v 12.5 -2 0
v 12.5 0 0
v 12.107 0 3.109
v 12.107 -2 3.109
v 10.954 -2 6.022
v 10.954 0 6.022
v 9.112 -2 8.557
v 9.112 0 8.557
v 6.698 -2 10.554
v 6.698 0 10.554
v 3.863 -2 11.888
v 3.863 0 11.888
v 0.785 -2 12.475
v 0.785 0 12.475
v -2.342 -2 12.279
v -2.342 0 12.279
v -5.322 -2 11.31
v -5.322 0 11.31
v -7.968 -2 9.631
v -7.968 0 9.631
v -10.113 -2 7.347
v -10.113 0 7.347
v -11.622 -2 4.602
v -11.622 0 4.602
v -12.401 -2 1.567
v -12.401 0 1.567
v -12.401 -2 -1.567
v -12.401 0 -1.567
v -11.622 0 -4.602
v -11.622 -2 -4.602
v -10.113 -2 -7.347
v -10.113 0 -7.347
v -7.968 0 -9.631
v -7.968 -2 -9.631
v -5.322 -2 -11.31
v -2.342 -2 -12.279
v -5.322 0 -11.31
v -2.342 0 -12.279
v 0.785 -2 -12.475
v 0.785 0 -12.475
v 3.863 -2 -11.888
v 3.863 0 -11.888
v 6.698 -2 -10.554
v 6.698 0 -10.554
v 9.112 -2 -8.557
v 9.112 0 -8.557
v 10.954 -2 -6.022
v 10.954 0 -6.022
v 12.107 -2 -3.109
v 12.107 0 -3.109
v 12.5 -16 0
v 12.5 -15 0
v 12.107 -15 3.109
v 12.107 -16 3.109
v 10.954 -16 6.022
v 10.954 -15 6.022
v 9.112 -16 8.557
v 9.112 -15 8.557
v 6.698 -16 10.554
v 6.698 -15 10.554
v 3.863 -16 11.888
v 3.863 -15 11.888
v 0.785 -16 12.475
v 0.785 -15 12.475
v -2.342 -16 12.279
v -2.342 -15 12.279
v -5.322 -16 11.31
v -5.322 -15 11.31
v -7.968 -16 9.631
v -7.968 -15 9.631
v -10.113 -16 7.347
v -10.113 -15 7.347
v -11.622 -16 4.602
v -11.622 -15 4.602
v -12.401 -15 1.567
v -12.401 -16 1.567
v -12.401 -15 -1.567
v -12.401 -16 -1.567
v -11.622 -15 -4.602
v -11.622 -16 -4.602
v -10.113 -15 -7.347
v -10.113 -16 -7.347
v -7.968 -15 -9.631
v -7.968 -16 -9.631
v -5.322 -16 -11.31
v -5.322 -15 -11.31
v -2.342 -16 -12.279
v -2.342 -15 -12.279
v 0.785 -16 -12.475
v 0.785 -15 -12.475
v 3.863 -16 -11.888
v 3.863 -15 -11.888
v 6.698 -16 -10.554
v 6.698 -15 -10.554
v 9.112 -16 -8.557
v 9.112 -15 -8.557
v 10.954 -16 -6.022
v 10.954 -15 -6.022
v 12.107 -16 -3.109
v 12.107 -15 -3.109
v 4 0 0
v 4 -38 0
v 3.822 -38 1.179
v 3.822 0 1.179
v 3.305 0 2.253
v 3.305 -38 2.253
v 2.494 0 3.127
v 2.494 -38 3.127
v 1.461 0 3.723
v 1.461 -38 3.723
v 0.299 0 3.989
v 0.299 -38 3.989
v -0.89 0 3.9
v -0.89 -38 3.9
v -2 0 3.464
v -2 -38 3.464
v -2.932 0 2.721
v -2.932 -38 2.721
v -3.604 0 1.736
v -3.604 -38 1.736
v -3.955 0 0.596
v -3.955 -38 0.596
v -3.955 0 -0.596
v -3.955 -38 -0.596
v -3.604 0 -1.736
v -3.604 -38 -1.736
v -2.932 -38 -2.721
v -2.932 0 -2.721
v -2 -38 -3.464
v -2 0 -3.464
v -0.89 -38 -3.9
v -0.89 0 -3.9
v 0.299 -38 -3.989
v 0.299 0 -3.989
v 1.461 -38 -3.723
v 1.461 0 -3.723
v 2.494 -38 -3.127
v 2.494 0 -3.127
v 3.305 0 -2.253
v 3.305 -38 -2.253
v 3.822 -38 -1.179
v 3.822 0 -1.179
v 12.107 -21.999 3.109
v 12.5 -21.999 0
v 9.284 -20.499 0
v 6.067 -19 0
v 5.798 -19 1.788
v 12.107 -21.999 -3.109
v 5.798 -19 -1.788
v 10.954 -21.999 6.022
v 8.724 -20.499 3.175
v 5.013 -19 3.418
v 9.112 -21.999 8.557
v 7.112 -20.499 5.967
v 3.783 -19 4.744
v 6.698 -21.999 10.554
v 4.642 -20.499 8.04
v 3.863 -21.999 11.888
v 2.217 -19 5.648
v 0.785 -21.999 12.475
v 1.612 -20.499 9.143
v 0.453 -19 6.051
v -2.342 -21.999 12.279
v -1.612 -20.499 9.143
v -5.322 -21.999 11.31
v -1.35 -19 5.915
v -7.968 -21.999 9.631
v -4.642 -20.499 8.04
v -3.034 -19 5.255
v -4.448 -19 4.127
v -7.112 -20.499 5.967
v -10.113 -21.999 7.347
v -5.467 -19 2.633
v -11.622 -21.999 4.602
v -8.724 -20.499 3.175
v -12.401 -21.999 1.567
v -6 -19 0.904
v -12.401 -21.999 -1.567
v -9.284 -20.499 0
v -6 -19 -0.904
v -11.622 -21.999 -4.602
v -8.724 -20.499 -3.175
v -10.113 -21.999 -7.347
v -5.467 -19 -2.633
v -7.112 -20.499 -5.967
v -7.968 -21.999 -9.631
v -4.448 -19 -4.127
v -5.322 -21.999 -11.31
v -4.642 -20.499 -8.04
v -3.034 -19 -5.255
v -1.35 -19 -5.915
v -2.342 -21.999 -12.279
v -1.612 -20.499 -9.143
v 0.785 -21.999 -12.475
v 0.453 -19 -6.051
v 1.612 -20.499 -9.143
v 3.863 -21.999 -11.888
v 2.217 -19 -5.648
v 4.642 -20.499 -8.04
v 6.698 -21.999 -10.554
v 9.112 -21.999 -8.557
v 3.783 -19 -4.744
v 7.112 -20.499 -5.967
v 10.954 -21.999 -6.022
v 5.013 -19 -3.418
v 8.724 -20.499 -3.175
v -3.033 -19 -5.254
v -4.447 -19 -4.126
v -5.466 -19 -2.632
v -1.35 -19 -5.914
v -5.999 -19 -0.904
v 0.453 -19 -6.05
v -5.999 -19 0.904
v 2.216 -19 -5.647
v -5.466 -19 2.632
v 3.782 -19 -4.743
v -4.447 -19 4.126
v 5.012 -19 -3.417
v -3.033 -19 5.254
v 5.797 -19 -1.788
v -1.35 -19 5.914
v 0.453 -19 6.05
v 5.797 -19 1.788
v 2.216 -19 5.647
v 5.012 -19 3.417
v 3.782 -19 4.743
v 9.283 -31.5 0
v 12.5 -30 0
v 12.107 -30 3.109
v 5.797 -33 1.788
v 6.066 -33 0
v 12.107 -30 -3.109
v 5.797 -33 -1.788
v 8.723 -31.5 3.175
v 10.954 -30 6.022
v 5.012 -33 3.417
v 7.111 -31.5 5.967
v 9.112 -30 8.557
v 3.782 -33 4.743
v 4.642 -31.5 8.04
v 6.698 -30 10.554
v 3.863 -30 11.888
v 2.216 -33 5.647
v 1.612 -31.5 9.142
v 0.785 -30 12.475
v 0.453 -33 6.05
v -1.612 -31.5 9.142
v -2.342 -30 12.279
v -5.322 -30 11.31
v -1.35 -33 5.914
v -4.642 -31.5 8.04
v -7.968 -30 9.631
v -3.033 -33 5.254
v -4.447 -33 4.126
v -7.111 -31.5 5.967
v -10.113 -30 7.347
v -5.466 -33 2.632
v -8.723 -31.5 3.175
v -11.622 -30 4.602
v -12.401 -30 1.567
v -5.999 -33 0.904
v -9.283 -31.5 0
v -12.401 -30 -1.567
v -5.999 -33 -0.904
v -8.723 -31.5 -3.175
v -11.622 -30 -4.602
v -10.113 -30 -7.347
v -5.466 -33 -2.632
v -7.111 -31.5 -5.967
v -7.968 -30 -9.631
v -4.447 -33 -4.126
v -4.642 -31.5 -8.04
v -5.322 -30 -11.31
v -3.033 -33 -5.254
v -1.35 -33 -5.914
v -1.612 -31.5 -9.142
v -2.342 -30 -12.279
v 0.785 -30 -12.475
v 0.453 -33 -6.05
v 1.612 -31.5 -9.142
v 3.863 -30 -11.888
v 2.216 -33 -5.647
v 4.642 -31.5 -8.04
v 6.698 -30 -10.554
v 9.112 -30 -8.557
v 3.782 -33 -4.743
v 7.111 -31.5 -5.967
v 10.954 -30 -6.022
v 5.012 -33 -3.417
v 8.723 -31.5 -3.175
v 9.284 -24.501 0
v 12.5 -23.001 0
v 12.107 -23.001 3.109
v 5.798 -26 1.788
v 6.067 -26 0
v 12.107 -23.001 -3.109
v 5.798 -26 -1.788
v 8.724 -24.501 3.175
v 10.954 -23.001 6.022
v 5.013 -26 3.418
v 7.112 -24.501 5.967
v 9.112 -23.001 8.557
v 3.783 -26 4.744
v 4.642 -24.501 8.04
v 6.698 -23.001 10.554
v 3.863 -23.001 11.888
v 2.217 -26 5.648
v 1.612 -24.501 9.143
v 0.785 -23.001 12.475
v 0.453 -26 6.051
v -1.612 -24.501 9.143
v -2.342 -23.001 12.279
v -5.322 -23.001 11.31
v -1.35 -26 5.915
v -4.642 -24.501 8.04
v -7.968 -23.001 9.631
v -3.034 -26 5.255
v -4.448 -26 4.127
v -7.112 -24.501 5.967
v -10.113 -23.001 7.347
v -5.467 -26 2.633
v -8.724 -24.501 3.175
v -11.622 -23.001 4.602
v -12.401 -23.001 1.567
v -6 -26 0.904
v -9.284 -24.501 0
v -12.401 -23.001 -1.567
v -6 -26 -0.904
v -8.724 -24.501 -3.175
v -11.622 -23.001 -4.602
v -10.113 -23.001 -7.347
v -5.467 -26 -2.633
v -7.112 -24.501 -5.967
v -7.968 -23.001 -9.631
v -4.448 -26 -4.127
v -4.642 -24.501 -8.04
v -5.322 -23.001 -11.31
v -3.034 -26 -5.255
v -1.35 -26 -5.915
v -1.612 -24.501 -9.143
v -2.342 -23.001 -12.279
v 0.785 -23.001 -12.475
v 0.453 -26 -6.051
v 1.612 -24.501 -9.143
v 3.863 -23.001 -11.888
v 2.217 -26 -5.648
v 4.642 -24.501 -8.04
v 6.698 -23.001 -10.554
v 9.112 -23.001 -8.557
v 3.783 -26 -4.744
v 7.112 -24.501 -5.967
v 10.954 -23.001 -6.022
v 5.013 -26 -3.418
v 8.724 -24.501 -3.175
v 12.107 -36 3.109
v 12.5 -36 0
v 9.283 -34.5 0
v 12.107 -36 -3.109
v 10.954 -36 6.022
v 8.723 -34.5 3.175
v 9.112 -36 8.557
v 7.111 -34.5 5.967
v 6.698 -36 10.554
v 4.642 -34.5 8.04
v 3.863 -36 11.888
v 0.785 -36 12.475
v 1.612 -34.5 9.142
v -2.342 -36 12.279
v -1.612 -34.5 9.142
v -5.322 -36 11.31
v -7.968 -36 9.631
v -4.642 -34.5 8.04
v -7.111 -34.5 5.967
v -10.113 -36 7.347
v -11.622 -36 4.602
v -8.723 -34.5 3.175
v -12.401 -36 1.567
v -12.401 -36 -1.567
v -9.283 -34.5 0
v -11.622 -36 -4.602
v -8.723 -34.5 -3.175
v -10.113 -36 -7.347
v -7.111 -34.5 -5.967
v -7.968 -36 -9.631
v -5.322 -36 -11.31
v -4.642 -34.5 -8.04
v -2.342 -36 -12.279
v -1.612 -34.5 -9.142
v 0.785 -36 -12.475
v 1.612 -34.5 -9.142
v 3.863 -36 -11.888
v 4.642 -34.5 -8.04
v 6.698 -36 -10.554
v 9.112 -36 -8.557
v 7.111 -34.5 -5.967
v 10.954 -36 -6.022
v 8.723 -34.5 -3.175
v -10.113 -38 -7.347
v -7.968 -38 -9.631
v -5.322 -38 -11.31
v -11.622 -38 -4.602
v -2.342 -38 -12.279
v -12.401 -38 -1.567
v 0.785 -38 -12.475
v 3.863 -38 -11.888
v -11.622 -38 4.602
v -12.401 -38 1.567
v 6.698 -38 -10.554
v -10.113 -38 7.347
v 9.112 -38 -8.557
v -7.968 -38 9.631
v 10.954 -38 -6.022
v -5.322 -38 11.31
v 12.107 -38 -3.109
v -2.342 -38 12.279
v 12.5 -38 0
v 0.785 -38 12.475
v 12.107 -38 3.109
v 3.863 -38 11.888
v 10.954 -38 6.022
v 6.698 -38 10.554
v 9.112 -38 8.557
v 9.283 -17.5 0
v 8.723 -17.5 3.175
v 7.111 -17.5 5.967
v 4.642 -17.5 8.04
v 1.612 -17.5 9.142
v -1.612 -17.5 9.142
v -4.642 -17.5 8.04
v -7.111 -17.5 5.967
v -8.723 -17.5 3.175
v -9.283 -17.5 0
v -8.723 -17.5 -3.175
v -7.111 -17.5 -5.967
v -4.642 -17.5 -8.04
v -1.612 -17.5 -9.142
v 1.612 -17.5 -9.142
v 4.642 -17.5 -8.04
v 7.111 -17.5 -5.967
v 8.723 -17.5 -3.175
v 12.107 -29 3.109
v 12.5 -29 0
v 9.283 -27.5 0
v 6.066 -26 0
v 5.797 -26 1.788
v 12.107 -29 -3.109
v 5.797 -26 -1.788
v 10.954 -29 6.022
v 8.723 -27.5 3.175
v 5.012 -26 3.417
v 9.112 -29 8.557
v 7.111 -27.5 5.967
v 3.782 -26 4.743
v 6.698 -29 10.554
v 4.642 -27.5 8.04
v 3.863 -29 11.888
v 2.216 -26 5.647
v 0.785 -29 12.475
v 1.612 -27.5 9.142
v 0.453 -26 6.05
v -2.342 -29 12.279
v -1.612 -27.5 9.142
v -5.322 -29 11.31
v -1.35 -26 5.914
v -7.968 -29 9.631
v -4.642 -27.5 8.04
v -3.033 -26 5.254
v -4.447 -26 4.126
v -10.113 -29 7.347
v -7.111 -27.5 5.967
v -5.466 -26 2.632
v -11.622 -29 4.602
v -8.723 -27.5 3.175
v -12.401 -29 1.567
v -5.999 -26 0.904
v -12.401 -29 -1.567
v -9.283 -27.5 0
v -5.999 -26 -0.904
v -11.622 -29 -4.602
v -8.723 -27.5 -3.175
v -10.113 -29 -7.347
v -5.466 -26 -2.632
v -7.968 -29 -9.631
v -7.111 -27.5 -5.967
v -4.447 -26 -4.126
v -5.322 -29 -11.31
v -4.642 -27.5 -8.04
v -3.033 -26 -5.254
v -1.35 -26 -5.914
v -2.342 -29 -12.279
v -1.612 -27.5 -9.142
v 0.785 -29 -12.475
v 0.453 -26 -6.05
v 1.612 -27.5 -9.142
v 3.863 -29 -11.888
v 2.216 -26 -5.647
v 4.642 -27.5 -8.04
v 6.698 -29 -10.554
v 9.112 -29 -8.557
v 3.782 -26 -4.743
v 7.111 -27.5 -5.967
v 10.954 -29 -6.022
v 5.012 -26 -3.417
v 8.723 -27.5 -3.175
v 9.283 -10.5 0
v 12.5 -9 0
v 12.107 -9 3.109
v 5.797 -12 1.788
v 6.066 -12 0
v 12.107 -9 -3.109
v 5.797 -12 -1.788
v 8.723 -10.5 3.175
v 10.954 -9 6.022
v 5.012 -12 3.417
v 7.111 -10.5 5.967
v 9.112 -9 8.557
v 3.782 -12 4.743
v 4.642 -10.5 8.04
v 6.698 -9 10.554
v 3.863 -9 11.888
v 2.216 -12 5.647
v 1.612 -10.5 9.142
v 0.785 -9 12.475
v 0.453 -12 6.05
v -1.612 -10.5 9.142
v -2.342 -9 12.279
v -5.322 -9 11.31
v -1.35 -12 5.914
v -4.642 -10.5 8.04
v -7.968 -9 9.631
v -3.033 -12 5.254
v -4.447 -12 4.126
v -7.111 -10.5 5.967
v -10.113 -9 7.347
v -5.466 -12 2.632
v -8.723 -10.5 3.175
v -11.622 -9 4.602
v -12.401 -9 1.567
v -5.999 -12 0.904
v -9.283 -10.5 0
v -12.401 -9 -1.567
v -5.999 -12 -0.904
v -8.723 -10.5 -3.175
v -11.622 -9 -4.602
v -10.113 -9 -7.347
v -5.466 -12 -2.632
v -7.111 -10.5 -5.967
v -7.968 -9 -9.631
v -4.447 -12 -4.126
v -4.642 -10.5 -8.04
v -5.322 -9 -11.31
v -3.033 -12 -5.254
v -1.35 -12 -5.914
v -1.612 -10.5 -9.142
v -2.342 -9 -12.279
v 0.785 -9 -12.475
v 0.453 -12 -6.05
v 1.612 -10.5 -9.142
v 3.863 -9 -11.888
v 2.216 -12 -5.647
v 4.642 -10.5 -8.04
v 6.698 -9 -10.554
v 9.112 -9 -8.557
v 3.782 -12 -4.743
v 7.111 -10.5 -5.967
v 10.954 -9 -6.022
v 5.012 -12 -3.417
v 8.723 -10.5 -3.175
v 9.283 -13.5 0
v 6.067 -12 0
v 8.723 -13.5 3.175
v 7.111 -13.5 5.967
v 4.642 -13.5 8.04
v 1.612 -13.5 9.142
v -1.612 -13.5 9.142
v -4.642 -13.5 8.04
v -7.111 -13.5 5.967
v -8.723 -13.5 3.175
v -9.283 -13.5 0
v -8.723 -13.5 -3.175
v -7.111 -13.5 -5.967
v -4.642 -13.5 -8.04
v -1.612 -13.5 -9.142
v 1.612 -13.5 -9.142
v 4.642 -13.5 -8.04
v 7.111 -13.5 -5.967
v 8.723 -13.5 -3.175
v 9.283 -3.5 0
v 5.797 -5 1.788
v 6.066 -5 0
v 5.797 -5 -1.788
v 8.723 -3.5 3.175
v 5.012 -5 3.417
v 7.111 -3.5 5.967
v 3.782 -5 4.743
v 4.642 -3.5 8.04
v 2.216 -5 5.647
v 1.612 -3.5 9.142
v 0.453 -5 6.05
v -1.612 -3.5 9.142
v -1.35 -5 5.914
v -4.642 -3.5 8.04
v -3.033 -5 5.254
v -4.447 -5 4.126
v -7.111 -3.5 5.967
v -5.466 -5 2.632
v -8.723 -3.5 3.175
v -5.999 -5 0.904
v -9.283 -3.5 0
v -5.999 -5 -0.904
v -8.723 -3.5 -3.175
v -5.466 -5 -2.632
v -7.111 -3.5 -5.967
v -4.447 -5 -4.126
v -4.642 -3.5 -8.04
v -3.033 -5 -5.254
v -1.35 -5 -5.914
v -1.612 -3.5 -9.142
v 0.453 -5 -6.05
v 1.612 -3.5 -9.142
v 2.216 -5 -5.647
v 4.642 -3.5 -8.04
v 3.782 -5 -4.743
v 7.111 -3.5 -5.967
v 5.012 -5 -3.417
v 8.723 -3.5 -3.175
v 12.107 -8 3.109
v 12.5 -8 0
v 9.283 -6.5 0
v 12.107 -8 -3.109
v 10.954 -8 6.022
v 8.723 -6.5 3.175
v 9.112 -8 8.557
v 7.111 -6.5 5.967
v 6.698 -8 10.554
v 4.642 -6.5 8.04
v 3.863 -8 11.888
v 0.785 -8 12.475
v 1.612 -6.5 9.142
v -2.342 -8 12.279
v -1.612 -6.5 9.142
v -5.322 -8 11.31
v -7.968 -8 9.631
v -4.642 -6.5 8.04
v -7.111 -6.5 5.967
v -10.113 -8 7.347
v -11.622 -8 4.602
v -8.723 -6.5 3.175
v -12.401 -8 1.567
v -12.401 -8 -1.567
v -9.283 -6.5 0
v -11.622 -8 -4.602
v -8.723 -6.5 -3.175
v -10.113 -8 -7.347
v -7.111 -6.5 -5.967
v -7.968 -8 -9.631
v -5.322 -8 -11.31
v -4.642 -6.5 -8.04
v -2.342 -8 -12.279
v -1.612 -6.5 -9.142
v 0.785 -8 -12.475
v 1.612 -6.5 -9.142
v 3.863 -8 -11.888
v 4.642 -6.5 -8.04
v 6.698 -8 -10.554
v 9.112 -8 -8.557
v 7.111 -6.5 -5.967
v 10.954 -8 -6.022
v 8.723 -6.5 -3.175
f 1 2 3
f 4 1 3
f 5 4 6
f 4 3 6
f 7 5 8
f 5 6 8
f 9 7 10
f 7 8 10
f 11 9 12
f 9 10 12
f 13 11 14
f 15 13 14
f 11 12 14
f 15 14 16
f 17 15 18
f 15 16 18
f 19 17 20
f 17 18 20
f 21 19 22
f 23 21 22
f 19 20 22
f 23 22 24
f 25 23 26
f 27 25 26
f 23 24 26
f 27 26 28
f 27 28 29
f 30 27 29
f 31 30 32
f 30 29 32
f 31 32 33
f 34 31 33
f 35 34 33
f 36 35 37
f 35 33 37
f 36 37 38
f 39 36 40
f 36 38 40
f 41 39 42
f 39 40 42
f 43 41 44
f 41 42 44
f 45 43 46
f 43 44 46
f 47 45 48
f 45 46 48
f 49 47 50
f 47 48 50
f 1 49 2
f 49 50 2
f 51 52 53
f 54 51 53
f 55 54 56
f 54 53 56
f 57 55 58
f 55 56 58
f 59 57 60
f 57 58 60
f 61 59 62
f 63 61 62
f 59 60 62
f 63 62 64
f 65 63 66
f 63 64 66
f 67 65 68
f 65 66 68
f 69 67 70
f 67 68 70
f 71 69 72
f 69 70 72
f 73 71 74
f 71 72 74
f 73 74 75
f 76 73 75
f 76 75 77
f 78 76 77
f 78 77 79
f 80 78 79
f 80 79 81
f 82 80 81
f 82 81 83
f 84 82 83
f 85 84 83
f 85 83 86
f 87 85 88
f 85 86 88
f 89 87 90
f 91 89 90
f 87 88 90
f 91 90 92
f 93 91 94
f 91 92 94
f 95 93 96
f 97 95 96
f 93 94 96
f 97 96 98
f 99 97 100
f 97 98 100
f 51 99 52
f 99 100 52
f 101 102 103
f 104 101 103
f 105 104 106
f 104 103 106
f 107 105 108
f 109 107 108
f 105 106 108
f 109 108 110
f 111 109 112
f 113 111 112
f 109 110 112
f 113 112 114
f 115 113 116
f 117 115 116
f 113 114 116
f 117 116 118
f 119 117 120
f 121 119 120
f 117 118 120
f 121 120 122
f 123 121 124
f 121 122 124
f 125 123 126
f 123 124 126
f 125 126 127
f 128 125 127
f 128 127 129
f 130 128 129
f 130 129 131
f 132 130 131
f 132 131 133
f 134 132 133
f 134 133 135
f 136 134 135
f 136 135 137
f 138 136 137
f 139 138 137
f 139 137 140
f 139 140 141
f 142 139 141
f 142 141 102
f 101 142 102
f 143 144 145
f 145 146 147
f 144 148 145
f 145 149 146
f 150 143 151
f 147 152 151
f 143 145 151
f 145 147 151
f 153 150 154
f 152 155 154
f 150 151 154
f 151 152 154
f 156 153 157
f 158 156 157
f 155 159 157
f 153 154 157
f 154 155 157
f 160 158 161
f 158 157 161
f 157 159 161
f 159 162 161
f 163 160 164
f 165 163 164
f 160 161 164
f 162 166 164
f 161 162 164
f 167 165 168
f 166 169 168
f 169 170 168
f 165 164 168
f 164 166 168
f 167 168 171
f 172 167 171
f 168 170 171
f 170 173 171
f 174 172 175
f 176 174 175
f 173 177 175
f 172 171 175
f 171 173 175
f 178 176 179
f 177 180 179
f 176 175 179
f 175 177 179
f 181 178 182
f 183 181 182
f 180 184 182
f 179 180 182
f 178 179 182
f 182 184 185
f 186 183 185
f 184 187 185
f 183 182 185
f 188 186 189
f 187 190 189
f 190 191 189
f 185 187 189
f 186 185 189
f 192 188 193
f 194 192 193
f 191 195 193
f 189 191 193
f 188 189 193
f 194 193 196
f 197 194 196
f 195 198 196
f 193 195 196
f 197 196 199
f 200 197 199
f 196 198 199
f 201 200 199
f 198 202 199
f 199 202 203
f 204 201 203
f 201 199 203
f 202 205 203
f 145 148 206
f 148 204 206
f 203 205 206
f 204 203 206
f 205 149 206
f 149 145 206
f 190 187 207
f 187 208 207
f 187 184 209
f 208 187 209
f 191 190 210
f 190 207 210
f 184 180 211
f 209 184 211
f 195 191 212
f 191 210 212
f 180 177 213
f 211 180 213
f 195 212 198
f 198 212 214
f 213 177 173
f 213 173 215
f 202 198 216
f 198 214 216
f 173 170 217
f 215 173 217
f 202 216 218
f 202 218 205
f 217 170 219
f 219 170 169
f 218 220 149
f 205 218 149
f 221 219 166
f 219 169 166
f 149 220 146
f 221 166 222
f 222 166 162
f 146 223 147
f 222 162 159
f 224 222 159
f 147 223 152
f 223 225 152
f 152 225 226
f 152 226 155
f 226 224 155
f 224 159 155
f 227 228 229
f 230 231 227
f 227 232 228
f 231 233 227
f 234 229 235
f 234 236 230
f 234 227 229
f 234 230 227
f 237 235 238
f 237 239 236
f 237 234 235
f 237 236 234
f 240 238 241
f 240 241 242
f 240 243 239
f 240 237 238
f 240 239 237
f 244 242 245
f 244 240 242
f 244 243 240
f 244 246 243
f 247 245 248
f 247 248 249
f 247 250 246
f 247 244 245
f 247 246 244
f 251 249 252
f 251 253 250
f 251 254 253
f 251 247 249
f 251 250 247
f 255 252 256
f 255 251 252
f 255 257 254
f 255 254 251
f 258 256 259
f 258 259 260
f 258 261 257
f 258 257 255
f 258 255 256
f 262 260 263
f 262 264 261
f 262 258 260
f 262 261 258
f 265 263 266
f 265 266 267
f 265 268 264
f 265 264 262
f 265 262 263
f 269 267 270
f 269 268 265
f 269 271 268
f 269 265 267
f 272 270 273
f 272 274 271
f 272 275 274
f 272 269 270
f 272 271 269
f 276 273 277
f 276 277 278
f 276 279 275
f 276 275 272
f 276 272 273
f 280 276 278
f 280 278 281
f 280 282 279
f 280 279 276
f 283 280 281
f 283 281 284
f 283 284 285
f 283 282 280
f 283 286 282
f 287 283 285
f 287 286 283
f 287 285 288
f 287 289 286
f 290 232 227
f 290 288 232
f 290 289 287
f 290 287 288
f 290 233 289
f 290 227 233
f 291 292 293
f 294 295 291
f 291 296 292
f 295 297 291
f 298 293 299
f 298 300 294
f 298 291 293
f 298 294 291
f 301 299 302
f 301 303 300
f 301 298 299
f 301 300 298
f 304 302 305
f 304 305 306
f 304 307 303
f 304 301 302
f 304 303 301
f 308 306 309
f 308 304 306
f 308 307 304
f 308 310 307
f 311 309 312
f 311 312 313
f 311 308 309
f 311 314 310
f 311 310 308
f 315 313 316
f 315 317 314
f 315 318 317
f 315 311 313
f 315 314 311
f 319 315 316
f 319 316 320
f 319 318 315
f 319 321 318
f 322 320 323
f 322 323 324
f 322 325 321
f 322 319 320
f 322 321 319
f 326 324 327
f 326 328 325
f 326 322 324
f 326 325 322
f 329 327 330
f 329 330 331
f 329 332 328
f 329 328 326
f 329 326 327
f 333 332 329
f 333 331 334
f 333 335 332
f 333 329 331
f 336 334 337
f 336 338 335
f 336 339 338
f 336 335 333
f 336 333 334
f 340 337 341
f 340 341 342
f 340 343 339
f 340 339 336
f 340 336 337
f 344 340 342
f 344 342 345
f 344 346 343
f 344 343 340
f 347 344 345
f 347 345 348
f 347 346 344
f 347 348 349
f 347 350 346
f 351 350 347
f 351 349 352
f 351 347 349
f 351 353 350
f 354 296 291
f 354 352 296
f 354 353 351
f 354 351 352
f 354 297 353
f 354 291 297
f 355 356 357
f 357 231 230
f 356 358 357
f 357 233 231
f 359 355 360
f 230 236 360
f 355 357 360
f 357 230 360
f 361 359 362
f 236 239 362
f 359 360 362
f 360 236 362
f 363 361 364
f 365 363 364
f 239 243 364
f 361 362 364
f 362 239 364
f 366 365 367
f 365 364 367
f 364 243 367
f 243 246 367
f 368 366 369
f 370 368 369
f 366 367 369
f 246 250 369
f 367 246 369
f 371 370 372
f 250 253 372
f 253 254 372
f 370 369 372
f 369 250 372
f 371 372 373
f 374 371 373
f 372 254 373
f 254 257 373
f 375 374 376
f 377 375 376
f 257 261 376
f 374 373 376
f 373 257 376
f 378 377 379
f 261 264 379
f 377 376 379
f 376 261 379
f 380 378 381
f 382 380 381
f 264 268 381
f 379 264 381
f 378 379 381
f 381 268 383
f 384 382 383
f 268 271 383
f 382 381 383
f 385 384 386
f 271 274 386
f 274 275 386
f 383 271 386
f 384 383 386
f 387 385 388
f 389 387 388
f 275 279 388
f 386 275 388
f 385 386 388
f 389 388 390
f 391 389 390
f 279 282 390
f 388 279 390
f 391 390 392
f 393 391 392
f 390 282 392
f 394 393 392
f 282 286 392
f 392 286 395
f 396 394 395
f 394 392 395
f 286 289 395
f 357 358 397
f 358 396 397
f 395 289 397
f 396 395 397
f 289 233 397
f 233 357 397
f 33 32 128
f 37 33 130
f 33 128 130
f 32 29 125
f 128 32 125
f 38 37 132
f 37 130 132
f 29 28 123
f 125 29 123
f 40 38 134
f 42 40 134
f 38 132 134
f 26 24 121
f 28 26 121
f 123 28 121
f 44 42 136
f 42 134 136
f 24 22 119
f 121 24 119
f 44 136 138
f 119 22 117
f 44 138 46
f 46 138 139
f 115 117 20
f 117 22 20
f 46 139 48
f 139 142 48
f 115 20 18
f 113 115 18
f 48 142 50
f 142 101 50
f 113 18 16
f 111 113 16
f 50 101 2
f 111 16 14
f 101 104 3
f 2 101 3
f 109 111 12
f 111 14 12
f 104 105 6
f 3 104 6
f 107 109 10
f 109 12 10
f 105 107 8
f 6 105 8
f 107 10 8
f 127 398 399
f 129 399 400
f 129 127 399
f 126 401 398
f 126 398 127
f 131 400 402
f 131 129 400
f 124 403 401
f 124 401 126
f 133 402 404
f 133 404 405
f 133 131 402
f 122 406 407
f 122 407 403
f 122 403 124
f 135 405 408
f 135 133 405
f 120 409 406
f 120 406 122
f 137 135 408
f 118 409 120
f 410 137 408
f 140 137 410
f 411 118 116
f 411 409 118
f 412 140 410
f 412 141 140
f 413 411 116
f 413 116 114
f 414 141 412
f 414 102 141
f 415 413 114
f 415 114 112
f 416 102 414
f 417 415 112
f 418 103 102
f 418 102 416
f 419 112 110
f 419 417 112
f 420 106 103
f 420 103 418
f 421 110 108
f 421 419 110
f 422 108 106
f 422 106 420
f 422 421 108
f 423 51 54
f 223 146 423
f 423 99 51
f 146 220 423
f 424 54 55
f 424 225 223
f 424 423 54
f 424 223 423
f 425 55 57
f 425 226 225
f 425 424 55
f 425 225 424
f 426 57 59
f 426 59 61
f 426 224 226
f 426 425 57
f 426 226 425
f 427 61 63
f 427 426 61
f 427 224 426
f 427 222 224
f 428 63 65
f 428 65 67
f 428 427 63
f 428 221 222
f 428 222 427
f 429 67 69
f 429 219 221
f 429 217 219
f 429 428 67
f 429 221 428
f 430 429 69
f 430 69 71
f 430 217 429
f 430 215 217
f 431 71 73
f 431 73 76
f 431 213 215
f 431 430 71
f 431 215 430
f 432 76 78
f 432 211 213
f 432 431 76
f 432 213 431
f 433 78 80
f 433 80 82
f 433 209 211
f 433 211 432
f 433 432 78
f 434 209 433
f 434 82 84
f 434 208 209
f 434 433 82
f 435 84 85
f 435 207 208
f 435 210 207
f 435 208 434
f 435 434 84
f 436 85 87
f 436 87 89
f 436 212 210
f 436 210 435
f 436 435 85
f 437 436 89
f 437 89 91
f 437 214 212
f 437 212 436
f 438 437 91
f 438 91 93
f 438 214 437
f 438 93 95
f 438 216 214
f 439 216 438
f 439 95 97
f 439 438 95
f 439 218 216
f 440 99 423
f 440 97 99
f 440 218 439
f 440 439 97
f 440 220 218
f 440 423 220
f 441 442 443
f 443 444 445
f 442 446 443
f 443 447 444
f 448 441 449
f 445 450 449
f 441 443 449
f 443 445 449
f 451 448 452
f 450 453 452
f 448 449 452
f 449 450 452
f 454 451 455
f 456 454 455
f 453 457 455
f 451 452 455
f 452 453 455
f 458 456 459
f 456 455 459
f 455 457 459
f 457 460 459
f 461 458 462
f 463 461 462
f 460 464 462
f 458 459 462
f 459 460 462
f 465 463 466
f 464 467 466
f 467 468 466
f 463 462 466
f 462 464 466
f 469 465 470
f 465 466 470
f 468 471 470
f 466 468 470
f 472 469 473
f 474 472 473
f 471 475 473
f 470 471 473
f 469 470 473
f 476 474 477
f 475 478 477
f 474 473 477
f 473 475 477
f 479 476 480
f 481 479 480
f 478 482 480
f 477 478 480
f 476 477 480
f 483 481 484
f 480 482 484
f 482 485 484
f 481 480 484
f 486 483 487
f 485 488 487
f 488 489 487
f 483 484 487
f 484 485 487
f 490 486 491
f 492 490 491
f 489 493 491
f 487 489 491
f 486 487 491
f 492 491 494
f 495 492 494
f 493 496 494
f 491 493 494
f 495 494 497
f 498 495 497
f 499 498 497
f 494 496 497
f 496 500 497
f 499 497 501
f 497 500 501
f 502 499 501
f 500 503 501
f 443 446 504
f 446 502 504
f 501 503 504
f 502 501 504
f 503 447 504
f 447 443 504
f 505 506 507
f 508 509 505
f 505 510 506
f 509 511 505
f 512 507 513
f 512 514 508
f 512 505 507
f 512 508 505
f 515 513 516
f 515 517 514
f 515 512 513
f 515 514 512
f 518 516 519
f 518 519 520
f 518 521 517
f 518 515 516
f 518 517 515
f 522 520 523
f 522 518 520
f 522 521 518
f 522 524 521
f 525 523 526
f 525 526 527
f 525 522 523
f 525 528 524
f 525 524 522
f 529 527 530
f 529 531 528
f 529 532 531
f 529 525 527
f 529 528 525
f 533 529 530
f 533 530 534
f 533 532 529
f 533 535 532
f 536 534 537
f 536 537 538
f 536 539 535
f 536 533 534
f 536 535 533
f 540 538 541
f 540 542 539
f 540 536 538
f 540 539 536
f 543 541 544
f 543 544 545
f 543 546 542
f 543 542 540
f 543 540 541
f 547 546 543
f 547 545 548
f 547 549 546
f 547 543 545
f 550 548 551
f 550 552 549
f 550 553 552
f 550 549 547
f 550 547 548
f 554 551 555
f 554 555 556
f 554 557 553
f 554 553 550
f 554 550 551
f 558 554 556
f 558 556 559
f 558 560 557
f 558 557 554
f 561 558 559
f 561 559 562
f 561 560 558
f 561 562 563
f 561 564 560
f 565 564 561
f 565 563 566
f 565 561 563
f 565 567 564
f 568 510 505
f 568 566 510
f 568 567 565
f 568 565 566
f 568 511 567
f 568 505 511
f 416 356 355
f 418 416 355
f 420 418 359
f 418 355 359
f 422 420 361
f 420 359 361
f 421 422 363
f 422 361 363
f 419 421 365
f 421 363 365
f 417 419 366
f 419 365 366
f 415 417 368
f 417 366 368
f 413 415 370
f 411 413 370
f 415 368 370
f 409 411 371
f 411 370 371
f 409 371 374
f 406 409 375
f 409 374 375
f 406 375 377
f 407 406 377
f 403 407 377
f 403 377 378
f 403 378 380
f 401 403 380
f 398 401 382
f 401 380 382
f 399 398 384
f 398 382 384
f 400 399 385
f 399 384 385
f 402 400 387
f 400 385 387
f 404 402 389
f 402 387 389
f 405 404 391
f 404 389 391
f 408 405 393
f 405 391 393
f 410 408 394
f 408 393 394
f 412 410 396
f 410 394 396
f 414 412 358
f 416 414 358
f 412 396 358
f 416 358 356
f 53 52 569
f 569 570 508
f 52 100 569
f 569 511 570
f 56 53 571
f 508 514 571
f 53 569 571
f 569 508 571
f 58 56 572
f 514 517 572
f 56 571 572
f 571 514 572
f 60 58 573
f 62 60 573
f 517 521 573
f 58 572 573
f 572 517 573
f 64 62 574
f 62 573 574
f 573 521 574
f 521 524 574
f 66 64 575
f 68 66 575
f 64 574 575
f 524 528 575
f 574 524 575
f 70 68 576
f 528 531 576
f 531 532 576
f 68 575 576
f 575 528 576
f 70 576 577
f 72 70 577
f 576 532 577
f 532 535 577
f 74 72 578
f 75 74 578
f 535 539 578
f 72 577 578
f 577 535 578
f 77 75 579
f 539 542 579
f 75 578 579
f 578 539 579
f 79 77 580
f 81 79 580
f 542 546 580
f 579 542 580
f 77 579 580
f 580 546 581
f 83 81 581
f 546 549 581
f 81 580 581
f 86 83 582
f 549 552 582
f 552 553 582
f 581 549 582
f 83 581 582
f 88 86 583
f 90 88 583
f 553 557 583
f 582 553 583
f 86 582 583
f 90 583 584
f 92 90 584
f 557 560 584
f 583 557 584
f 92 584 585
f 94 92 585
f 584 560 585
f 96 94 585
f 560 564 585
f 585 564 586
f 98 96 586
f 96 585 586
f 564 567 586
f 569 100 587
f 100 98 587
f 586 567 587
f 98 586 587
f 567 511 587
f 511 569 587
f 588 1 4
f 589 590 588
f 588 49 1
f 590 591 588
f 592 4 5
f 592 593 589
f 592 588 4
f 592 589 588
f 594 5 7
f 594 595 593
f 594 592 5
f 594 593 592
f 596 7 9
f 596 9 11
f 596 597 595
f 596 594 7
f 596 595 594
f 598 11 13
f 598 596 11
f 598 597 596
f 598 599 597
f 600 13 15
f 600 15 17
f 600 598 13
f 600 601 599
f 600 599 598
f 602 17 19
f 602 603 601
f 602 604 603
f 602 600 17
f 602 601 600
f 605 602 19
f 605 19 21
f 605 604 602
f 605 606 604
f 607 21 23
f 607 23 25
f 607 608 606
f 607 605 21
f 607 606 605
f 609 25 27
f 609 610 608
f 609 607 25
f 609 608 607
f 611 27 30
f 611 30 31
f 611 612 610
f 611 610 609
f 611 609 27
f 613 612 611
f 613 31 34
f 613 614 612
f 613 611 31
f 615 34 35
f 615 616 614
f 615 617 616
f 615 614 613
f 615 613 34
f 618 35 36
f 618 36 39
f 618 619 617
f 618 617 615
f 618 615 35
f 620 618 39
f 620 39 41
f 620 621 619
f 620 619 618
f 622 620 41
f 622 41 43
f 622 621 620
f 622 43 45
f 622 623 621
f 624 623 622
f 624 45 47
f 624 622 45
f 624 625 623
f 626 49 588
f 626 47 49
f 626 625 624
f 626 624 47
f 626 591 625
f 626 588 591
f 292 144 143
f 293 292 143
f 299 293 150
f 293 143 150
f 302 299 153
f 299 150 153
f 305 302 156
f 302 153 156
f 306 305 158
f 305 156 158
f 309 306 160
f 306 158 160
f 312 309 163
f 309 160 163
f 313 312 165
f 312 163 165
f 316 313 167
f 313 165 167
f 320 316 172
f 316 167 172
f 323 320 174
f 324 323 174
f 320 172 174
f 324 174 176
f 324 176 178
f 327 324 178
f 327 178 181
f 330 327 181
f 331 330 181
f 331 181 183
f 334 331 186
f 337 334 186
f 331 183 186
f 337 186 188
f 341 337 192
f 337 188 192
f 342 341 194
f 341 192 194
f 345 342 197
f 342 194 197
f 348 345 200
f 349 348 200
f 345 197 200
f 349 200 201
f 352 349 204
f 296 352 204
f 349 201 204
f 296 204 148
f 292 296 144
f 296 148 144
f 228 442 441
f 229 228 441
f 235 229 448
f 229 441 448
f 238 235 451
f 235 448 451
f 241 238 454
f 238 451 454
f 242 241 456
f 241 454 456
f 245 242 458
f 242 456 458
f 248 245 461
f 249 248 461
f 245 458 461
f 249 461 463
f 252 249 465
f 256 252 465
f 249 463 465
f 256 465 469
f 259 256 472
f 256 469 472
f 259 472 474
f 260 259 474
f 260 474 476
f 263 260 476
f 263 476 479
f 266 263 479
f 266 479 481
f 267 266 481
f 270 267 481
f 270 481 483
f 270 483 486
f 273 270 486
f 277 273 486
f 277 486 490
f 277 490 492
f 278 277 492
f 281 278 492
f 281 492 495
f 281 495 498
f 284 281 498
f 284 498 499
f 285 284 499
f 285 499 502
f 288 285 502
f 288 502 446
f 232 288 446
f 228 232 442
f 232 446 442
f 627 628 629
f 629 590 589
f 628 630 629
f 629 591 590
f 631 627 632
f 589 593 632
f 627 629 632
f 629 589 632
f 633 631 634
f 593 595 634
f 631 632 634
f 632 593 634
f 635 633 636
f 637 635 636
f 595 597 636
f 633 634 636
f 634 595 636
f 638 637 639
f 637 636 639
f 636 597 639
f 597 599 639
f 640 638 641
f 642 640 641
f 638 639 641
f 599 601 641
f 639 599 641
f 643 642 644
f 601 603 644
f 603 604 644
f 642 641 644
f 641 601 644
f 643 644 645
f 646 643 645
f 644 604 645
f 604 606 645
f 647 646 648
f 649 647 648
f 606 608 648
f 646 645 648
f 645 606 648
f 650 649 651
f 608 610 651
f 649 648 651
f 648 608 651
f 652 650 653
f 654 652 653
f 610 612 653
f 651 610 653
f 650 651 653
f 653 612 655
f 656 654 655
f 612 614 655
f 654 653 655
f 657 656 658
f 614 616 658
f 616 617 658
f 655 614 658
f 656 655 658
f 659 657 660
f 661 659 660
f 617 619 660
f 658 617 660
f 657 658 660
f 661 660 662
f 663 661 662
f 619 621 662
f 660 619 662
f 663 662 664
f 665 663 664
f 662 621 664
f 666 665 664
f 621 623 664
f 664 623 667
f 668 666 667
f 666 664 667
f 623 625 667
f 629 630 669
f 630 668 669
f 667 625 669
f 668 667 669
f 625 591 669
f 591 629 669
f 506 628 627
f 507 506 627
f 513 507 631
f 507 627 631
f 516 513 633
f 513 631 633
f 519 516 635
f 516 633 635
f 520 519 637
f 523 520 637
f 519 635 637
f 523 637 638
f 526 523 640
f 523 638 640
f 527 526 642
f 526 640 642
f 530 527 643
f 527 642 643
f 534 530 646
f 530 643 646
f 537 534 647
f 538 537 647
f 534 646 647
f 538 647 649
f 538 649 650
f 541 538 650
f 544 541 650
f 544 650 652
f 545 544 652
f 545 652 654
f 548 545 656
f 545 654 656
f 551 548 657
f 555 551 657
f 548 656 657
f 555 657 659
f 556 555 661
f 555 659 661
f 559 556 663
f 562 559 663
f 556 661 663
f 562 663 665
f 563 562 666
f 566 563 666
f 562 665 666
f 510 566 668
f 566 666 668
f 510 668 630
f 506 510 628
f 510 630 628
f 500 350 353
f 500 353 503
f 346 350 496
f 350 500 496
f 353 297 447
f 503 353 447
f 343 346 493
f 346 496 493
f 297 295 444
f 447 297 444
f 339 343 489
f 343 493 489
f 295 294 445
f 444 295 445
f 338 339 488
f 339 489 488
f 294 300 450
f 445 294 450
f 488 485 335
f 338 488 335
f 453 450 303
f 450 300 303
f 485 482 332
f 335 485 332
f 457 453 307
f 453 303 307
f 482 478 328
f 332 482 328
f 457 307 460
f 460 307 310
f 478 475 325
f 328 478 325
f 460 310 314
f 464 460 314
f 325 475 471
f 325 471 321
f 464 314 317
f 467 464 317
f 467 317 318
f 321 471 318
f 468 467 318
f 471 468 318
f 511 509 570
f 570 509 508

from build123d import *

# Parameters (mm, degrees)
F0_R      = 12.5
F1_DEPTH  = 5
F2_SIZE2  = 6.4335207615
F2_SIZE   = 3
F3_R      = 12.5
F4_DEPTH  = 7
F5_SIZE2  = 6.433511
F5_SIZE   = 2.99999
F6_R      = 12.5
F7_DEPTH  = 7
F8_SIZE2  = 6.433421
F8_SIZE   = 2.9999
F9_R      = 12.5
F10_DEPTH = 7
F11_SIZE2 = 6.432521
F11_SIZE  = 2.999
F12_R     = 12.5
F13_DEPTH = 7
F15_R     = 12.5
F16_DEPTH = 5
F17_SIZE2 = 6.433511
F17_SIZE  = 2.99999
F19_D     = 8


# Not quite as in the source:
# - a fillet or chamfer that OpenCascade refuses, or shapes differently, is made with other operations: its cross-section is extruded or revolved along the edge and cut away or added
# - a fillet or chamfer is up to 0.001 mm smaller than in the source, because OpenCascade refuses the exact size


with BuildPart() as f1:
    # F0 (on Front) → F1 (new body)
    with BuildSketch(Plane.XZ):
        Circle(F0_R)
    extrude(amount=F1_DEPTH)

    # F2
    f2_edges = [f1.edges().sort_by_distance(p)[0] for p in [
        (-12.5, -5, 0),
    ]]
    f2_side = f1.faces().sort_by_distance((-12.5, -2.5, 0))[0]
    chamfer(f2_edges, length=F2_SIZE, length2=F2_SIZE2, reference=f2_side)

    # F3 (on face) → F4 (join)
    with BuildSketch(Plane.XZ.offset(5)):
        Circle(F3_R)
    extrude(amount=F4_DEPTH)

    # F5 (size 3 and 6.4335207615 in the source; OpenCascade refuses exactly that, so slightly less here)
    f5_edges = [f1.edges().sort_by_distance(p)[0] for p in [
        (-12.5, -5, 0),
        (-12.5, -12, 0),
    ]]
    f5_side = f1.faces().sort_by_distance((-12.5, -8.5, 0))[0]
    chamfer(f5_edges, length=F5_SIZE, length2=F5_SIZE2, reference=f5_side)

    # F6 (on face) → F7 (join)
    with BuildSketch(Plane.XZ.offset(12)):
        Circle(F6_R)
    extrude(amount=F7_DEPTH)

    # F8 (size 3 and 6.4335207615 in the source; OpenCascade refuses exactly that, so slightly less here)
    f8_edges = [f1.edges().sort_by_distance(p)[0] for p in [
        (-12.5, -12, 0),
        (-12.5, -19, 0),
    ]]
    f8_side = f1.faces().sort_by_distance((-12.5, -15.5, 0))[0]
    chamfer(f8_edges, length=F8_SIZE, length2=F8_SIZE2, reference=f8_side)

    # F9 (on face) → F10 (join)
    with BuildSketch(Plane.XZ.offset(19)):
        Circle(F9_R)
    extrude(amount=F10_DEPTH)

    # F11 (size 3 and 6.4335207615 in the source; OpenCascade refuses exactly that, so slightly less here)
    f11_edges = [f1.edges().sort_by_distance(p)[0] for p in [
        (-12.5, -19, 0),
        (-12.5, -26, 0),
    ]]
    f11_side = f1.faces().sort_by_distance((-12.5, -22.5, 0))[0]
    chamfer(f11_edges, length=F11_SIZE, length2=F11_SIZE2, reference=f11_side)

    # F12 (on face) → F13 (join)
    with BuildSketch(Plane.XZ.offset(26)):
        Circle(F12_R)
    extrude(amount=F13_DEPTH)

    # F14: chamfer of 3 x 6.4335207615 on 2 edges, made by hand

    # F14_s1 → F14_t2 (revolve, cut)
    with BuildSketch(Plane.XY):
        Polygon((12.5, -29), (6.0664792385, -26), (12.5, -26), align=None)
    revolve(axis=Axis((0, -26, 0), (0, -1, 0)), mode=Mode.SUBTRACT)

    # F14_s3 → F14_t4 (revolve, cut)
    with BuildSketch(Plane.XY):
        Polygon((12.5, -30), (6.0664792385, -33), (12.5, -33), align=None)
    revolve(axis=Axis((0, -33, 0), (0, -1, 0)), mode=Mode.SUBTRACT)

    # F15 (on face) → F16 (join)
    with BuildSketch(Plane.XZ.offset(33)):
        Circle(F15_R)
    extrude(amount=F16_DEPTH)

    # F17 (size 3 and 6.4335207615 in the source; OpenCascade refuses exactly that, so slightly less here)
    f17_edges = [f1.edges().sort_by_distance(p)[0] for p in [
        (-12.5, -33, 0),
    ]]
    f17_side = f1.faces().sort_by_distance((-12.5, -35.5, 0))[0]
    chamfer(f17_edges, length=F17_SIZE, length2=F17_SIZE2, reference=f17_side)

    # F19 (through all)
    with Locations(Plane(origin=(0, 0, 0), x_dir=(-1, 0, 0), z_dir=(0, 1, 0))):
        with Locations((0, 0)):
            Hole(F19_D / 2)


solid = f1.part
